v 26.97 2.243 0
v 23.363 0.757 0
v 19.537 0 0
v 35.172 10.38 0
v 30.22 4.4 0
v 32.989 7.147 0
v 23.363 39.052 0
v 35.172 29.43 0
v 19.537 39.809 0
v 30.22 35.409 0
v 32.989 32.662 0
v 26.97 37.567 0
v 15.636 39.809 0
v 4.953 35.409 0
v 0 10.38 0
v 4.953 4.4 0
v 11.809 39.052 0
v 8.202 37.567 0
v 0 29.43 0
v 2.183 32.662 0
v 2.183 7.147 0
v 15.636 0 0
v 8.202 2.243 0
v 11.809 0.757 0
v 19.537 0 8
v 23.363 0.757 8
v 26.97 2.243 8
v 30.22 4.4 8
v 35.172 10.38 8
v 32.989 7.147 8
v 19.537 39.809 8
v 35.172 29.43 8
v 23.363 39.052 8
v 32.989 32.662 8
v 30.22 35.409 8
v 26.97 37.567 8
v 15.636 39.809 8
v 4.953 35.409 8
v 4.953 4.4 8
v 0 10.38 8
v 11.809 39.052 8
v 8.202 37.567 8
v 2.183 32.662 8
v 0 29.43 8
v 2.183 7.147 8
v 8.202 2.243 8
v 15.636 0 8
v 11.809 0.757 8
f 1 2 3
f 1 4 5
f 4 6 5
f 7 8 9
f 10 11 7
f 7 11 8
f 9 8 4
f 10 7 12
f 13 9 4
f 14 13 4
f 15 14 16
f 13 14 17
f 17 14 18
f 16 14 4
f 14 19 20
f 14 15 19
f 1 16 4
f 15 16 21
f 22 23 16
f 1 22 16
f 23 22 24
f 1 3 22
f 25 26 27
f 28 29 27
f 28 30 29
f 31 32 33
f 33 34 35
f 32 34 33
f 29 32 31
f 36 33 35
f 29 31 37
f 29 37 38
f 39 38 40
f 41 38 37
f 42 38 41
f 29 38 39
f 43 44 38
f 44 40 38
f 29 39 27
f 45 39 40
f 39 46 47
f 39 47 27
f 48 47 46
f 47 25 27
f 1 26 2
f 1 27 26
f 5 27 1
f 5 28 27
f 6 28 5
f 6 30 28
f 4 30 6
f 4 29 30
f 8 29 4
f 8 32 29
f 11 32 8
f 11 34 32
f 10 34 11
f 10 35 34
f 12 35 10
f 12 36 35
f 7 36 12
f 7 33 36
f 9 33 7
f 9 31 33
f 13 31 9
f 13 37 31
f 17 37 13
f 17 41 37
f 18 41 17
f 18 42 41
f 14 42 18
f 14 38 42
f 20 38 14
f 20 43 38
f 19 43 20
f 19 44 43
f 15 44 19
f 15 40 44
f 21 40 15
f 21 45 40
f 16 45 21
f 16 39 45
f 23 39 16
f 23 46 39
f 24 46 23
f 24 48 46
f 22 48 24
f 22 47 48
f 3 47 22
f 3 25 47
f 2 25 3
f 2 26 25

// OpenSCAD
$fn = 32;

// ----------------------------------------------------------------------
// Flat adaptor: double_d, 8 mm thick
// ----------------------------------------------------------------------

// --- parameters (mm) ---
profile_height = 8;       // extrusion height
profile_points = 24;      // points of the closed outline

profile = [[35.172, 29.43], [32.989, 32.662], [30.22, 35.409], [26.97, 37.567], [23.363, 39.052], [19.537, 39.809], [15.636, 39.809], [11.809, 39.052], [8.202, 37.567], [4.953, 35.409], [2.183, 32.662], [0, 29.43], [0, 10.38], [2.183, 7.147], [4.953, 4.4], [8.202, 2.243], [11.809, 0.757], [15.636, 0], [19.537, 0], [23.363, 0.757], [26.97, 2.243], [30.22, 4.4], [32.989, 7.147], [35.172, 10.38]];  // single closed polygon, 24 points, counter clockwise

// --- the one profile operation ---
linear_extrude(height = profile_height) polygon(points = profile);
